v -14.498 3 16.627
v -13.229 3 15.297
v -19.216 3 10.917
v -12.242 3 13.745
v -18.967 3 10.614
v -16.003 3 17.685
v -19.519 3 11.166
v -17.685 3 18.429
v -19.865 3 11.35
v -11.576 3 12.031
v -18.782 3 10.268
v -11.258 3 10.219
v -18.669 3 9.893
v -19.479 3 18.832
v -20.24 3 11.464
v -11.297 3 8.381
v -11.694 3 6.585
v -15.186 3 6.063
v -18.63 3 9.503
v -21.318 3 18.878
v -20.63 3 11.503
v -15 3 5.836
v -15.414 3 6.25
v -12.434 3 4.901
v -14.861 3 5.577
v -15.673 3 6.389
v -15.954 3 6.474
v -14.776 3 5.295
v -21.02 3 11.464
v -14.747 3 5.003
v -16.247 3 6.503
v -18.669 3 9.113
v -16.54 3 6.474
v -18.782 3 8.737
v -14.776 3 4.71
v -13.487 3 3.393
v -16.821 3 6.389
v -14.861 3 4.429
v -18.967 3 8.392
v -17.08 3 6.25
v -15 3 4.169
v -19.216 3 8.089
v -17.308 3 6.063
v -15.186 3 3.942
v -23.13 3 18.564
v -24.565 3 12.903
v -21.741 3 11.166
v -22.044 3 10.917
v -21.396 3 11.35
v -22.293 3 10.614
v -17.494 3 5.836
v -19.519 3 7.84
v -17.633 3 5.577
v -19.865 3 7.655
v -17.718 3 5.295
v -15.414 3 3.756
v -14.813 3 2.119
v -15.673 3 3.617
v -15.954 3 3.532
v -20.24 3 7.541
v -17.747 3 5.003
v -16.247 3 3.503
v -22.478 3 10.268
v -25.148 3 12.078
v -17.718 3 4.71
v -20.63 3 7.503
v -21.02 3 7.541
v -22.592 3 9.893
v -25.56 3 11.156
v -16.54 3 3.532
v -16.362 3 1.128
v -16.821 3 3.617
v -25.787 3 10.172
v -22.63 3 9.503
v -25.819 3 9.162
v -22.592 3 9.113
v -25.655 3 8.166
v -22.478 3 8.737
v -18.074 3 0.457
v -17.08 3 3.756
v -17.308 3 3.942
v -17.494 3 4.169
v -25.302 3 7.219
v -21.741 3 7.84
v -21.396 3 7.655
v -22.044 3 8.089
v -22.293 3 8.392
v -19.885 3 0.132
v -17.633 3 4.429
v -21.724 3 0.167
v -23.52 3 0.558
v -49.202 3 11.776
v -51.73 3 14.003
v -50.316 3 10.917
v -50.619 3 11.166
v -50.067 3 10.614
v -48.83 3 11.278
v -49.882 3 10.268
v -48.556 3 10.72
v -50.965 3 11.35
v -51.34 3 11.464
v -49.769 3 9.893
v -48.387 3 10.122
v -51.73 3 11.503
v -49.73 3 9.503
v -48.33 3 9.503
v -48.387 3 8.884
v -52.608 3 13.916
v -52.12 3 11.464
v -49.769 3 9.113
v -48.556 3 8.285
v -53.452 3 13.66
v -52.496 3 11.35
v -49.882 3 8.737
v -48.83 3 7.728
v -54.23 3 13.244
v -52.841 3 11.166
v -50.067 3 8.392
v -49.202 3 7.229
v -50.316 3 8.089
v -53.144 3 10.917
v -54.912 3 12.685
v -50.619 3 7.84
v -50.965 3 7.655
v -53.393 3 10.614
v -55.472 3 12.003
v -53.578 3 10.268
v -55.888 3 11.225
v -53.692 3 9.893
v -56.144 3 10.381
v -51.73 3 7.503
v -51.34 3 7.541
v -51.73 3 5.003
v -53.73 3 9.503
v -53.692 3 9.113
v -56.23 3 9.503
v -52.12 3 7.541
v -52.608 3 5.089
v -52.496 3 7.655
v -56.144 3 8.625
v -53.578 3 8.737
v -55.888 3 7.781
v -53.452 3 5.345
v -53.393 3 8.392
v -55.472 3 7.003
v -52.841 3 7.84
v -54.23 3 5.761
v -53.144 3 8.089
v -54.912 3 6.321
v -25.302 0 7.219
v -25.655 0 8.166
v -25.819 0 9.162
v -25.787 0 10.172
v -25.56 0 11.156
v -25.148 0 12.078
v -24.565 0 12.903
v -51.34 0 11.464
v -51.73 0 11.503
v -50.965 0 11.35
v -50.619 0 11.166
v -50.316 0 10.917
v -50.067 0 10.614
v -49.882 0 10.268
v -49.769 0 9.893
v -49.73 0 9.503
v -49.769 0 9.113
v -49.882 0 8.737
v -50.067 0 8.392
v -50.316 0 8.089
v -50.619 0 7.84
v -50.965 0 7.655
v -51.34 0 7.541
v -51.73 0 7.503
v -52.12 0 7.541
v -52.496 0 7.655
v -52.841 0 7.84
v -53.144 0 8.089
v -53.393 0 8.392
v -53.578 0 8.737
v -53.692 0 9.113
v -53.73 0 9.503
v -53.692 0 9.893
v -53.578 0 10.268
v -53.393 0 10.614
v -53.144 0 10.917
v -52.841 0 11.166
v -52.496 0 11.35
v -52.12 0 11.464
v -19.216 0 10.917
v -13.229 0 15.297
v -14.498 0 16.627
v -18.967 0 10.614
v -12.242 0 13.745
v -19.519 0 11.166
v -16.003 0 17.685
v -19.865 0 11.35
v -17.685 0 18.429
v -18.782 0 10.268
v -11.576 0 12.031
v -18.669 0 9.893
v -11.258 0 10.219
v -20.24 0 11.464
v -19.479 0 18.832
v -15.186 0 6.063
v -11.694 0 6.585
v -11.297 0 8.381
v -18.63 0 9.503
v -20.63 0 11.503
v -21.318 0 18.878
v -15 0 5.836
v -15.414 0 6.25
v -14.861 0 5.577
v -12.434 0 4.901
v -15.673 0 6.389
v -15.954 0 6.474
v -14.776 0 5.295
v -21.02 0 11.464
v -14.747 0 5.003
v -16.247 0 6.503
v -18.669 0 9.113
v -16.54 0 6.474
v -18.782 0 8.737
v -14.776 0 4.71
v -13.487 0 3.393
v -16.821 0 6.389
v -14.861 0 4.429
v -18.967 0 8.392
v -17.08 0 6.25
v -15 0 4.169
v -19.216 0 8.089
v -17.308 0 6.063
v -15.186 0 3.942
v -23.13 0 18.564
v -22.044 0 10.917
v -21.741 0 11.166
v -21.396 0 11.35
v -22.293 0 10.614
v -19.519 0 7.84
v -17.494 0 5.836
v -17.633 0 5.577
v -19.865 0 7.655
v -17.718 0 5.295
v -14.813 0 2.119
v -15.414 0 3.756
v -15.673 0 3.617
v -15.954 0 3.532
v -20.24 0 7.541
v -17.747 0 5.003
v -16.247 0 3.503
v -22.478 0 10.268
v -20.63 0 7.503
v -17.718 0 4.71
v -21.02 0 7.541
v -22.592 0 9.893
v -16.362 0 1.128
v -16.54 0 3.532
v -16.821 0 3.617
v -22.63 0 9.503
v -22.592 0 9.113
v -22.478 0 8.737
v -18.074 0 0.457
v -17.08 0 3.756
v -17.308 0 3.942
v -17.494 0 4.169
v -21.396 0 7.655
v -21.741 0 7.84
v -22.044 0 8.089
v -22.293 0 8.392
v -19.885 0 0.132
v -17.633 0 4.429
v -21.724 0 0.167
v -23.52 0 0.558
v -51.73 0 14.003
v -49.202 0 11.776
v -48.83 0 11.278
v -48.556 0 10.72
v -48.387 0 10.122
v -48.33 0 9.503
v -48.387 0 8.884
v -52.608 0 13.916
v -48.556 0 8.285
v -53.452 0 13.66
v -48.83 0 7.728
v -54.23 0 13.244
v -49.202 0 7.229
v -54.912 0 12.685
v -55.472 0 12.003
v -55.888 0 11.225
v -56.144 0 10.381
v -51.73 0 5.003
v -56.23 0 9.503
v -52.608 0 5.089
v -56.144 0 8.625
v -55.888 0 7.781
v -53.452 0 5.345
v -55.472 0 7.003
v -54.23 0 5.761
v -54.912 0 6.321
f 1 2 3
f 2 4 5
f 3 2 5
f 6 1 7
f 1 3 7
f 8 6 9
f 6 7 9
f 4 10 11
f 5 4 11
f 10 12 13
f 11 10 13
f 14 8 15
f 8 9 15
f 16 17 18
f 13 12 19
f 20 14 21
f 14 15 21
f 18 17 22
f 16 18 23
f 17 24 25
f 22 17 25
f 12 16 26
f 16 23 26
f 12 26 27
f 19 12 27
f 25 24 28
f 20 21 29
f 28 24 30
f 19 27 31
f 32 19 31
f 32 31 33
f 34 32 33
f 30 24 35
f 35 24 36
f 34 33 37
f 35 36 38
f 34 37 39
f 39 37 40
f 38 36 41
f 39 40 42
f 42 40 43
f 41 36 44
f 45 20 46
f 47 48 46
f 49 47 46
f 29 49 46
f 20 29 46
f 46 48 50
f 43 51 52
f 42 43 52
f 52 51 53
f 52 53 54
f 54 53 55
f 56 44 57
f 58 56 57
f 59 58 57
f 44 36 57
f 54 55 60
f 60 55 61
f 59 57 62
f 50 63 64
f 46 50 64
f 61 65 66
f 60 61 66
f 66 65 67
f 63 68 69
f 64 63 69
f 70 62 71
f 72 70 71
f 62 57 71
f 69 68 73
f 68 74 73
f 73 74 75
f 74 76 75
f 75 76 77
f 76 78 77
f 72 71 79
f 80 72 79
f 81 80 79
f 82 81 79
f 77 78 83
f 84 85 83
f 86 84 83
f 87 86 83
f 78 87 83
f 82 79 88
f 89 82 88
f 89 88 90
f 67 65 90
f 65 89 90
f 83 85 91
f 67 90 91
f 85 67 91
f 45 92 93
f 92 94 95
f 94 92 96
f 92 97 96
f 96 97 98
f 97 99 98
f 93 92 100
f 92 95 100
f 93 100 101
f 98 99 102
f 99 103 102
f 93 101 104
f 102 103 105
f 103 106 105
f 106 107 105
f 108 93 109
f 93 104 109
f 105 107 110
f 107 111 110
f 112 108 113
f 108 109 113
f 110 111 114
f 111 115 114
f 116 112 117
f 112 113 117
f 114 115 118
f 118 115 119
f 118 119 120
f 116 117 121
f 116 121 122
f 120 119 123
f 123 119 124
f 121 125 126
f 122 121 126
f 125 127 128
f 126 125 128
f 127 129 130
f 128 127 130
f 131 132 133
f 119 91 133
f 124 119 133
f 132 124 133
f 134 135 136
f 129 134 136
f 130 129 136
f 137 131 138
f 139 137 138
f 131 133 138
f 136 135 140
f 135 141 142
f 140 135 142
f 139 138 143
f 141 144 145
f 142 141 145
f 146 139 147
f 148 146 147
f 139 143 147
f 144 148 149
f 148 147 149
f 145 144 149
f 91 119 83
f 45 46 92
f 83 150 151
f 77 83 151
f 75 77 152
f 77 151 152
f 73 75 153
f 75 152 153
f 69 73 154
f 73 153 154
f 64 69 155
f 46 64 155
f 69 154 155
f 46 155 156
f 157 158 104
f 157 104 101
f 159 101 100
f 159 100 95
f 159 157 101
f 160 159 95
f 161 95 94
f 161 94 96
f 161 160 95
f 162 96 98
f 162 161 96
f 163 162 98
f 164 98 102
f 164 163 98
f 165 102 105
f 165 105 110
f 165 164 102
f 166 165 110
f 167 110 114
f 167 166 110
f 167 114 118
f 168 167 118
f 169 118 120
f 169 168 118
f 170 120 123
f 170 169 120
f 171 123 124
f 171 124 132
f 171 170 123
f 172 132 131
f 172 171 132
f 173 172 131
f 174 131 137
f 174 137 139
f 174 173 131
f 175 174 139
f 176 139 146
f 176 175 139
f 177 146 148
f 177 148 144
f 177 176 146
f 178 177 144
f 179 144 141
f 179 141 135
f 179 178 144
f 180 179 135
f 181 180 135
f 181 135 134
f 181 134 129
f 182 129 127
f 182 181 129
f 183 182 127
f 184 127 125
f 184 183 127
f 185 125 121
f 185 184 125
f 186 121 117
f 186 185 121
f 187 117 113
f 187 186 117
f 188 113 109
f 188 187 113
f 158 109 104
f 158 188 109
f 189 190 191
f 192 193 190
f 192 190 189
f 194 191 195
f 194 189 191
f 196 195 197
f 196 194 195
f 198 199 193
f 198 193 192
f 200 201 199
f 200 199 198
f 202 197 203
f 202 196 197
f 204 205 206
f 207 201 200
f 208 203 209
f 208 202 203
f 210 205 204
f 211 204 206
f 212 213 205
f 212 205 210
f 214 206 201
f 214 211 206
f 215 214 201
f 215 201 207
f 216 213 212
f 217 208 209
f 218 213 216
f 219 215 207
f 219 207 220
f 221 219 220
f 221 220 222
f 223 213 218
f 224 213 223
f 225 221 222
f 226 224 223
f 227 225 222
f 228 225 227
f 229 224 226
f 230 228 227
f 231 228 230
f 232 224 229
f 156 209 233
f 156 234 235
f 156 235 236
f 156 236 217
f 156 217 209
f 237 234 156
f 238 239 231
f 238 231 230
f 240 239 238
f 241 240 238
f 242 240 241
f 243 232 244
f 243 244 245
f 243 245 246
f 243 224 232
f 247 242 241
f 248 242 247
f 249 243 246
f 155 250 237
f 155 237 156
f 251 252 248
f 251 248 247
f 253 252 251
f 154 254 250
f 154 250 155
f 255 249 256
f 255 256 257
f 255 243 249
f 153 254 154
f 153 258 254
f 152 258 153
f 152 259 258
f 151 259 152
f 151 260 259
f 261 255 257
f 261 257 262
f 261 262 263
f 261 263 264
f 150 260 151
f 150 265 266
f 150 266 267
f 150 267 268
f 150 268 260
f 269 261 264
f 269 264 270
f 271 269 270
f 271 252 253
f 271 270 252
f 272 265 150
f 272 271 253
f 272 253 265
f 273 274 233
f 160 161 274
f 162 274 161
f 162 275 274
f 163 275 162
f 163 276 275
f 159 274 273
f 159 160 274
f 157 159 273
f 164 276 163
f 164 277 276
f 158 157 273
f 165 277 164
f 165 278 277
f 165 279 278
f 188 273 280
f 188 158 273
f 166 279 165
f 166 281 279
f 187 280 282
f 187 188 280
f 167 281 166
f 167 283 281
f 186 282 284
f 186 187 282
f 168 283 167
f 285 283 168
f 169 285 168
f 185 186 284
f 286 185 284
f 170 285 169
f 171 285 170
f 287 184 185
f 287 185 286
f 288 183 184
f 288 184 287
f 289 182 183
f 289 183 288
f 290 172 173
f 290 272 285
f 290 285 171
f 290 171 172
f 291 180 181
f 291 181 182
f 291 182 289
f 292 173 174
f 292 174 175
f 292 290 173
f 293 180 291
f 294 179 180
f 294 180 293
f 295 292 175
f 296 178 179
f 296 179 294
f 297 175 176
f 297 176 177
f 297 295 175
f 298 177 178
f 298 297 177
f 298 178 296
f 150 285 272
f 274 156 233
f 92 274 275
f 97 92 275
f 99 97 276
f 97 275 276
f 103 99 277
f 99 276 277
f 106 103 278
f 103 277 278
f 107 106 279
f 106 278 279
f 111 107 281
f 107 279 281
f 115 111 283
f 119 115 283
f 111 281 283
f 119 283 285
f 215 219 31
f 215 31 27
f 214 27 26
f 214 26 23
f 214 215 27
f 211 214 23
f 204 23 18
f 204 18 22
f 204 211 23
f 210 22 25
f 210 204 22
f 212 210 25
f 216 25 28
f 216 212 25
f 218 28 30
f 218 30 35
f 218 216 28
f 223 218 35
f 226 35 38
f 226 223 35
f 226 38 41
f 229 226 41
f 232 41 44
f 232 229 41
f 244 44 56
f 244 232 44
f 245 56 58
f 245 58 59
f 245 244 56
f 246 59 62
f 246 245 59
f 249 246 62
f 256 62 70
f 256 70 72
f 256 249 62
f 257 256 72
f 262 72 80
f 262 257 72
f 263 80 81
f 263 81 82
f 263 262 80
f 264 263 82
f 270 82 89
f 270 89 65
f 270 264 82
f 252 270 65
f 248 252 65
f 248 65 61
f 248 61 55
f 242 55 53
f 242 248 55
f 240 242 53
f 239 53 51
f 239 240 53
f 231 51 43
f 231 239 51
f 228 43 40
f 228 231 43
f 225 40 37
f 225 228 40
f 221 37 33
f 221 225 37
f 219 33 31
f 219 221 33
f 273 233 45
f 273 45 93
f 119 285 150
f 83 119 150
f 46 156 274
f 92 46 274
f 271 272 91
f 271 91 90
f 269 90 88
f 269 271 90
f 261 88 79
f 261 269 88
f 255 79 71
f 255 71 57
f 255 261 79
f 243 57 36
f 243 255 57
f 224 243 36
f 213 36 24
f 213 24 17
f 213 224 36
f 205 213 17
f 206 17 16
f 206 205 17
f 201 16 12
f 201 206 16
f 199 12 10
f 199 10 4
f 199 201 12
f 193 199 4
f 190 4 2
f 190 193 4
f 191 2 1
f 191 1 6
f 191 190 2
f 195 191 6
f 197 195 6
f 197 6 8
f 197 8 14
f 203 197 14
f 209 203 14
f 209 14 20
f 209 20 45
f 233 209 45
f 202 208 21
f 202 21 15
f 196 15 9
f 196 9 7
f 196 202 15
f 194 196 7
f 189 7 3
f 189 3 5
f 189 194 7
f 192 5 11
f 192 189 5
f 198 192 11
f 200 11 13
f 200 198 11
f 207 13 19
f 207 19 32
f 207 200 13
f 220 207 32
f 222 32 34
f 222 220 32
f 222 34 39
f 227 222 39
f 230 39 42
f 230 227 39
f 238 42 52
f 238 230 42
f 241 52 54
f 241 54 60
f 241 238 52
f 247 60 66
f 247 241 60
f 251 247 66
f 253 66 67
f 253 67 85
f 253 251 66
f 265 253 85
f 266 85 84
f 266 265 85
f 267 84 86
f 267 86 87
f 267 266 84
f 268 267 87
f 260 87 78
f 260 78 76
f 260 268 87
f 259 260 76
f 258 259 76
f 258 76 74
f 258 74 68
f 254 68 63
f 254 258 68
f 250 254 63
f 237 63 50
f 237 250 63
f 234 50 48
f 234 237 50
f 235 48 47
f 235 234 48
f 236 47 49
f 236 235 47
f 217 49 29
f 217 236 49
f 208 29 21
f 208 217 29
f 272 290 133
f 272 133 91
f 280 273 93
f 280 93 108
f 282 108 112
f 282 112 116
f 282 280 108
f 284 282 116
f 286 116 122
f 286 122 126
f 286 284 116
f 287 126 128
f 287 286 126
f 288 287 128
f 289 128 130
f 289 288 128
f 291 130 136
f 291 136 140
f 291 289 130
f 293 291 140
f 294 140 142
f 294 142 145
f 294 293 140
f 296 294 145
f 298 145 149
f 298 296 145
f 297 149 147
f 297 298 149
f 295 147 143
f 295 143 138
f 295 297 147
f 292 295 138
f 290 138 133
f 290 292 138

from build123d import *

# Parameters (mm, degrees)
SKETCH1_R           = 2
SKETCH1_R_2         = 1.5
BOSS_EXTRUDE1_DEPTH = 3


with BuildPart() as part:
    # Sketch1 → Boss-Extrude1 (new body)
    with BuildSketch(Plane(origin=(0, 0, 0), x_dir=(1, 0, 0), z_dir=(0, 1, 0))):
        with BuildLine():
            Line((-51.730151438, -5.002739553), (-23.52046035, -0.558125845))
            ThreePointArc((-23.52046035, -0.558125845), (-11.232359056, -9.299028138), (-23.130151438, -18.56419639))
            Line((-23.130151438, -18.56419639), (-51.730151438, -14.002739553))
            ThreePointArc((-51.730151438, -14.002739553), (-56.230151438, -9.502739553), (-51.730151438, -5.002739553))
        make_face()
        with Locations(Location((-20.630151438, -9.502739553, 0), (0, 0, 270))):
            Circle(SKETCH1_R, mode=Mode.SUBTRACT)
        with Locations(Location((-51.730151438, -9.502739553, 0), (0, 0, 270))):
            Circle(SKETCH1_R, mode=Mode.SUBTRACT)
        with Locations(Location((-16.247019321, -5.002739553, 0), (0, 0, 270))):
            Circle(SKETCH1_R_2, mode=Mode.SUBTRACT)
        with BuildLine():
            Line((-49.20201043, -7.229305358), (-25.30201043, -7.219379406))
            ThreePointArc((-25.30201043, -7.219379406), (-25.78692763, -10.171813025), (-24.564614553, -12.902739553))
            Line((-24.564614553, -12.902739553), (-49.20201043, -11.776173749))
            ThreePointArc((-49.20201043, -11.776173749), (-48.330151438, -9.502739553), (-49.20201043, -7.229305358))
        make_face(mode=Mode.SUBTRACT)
    extrude(amount=BOSS_EXTRUDE1_DEPTH)


solid = part.part
